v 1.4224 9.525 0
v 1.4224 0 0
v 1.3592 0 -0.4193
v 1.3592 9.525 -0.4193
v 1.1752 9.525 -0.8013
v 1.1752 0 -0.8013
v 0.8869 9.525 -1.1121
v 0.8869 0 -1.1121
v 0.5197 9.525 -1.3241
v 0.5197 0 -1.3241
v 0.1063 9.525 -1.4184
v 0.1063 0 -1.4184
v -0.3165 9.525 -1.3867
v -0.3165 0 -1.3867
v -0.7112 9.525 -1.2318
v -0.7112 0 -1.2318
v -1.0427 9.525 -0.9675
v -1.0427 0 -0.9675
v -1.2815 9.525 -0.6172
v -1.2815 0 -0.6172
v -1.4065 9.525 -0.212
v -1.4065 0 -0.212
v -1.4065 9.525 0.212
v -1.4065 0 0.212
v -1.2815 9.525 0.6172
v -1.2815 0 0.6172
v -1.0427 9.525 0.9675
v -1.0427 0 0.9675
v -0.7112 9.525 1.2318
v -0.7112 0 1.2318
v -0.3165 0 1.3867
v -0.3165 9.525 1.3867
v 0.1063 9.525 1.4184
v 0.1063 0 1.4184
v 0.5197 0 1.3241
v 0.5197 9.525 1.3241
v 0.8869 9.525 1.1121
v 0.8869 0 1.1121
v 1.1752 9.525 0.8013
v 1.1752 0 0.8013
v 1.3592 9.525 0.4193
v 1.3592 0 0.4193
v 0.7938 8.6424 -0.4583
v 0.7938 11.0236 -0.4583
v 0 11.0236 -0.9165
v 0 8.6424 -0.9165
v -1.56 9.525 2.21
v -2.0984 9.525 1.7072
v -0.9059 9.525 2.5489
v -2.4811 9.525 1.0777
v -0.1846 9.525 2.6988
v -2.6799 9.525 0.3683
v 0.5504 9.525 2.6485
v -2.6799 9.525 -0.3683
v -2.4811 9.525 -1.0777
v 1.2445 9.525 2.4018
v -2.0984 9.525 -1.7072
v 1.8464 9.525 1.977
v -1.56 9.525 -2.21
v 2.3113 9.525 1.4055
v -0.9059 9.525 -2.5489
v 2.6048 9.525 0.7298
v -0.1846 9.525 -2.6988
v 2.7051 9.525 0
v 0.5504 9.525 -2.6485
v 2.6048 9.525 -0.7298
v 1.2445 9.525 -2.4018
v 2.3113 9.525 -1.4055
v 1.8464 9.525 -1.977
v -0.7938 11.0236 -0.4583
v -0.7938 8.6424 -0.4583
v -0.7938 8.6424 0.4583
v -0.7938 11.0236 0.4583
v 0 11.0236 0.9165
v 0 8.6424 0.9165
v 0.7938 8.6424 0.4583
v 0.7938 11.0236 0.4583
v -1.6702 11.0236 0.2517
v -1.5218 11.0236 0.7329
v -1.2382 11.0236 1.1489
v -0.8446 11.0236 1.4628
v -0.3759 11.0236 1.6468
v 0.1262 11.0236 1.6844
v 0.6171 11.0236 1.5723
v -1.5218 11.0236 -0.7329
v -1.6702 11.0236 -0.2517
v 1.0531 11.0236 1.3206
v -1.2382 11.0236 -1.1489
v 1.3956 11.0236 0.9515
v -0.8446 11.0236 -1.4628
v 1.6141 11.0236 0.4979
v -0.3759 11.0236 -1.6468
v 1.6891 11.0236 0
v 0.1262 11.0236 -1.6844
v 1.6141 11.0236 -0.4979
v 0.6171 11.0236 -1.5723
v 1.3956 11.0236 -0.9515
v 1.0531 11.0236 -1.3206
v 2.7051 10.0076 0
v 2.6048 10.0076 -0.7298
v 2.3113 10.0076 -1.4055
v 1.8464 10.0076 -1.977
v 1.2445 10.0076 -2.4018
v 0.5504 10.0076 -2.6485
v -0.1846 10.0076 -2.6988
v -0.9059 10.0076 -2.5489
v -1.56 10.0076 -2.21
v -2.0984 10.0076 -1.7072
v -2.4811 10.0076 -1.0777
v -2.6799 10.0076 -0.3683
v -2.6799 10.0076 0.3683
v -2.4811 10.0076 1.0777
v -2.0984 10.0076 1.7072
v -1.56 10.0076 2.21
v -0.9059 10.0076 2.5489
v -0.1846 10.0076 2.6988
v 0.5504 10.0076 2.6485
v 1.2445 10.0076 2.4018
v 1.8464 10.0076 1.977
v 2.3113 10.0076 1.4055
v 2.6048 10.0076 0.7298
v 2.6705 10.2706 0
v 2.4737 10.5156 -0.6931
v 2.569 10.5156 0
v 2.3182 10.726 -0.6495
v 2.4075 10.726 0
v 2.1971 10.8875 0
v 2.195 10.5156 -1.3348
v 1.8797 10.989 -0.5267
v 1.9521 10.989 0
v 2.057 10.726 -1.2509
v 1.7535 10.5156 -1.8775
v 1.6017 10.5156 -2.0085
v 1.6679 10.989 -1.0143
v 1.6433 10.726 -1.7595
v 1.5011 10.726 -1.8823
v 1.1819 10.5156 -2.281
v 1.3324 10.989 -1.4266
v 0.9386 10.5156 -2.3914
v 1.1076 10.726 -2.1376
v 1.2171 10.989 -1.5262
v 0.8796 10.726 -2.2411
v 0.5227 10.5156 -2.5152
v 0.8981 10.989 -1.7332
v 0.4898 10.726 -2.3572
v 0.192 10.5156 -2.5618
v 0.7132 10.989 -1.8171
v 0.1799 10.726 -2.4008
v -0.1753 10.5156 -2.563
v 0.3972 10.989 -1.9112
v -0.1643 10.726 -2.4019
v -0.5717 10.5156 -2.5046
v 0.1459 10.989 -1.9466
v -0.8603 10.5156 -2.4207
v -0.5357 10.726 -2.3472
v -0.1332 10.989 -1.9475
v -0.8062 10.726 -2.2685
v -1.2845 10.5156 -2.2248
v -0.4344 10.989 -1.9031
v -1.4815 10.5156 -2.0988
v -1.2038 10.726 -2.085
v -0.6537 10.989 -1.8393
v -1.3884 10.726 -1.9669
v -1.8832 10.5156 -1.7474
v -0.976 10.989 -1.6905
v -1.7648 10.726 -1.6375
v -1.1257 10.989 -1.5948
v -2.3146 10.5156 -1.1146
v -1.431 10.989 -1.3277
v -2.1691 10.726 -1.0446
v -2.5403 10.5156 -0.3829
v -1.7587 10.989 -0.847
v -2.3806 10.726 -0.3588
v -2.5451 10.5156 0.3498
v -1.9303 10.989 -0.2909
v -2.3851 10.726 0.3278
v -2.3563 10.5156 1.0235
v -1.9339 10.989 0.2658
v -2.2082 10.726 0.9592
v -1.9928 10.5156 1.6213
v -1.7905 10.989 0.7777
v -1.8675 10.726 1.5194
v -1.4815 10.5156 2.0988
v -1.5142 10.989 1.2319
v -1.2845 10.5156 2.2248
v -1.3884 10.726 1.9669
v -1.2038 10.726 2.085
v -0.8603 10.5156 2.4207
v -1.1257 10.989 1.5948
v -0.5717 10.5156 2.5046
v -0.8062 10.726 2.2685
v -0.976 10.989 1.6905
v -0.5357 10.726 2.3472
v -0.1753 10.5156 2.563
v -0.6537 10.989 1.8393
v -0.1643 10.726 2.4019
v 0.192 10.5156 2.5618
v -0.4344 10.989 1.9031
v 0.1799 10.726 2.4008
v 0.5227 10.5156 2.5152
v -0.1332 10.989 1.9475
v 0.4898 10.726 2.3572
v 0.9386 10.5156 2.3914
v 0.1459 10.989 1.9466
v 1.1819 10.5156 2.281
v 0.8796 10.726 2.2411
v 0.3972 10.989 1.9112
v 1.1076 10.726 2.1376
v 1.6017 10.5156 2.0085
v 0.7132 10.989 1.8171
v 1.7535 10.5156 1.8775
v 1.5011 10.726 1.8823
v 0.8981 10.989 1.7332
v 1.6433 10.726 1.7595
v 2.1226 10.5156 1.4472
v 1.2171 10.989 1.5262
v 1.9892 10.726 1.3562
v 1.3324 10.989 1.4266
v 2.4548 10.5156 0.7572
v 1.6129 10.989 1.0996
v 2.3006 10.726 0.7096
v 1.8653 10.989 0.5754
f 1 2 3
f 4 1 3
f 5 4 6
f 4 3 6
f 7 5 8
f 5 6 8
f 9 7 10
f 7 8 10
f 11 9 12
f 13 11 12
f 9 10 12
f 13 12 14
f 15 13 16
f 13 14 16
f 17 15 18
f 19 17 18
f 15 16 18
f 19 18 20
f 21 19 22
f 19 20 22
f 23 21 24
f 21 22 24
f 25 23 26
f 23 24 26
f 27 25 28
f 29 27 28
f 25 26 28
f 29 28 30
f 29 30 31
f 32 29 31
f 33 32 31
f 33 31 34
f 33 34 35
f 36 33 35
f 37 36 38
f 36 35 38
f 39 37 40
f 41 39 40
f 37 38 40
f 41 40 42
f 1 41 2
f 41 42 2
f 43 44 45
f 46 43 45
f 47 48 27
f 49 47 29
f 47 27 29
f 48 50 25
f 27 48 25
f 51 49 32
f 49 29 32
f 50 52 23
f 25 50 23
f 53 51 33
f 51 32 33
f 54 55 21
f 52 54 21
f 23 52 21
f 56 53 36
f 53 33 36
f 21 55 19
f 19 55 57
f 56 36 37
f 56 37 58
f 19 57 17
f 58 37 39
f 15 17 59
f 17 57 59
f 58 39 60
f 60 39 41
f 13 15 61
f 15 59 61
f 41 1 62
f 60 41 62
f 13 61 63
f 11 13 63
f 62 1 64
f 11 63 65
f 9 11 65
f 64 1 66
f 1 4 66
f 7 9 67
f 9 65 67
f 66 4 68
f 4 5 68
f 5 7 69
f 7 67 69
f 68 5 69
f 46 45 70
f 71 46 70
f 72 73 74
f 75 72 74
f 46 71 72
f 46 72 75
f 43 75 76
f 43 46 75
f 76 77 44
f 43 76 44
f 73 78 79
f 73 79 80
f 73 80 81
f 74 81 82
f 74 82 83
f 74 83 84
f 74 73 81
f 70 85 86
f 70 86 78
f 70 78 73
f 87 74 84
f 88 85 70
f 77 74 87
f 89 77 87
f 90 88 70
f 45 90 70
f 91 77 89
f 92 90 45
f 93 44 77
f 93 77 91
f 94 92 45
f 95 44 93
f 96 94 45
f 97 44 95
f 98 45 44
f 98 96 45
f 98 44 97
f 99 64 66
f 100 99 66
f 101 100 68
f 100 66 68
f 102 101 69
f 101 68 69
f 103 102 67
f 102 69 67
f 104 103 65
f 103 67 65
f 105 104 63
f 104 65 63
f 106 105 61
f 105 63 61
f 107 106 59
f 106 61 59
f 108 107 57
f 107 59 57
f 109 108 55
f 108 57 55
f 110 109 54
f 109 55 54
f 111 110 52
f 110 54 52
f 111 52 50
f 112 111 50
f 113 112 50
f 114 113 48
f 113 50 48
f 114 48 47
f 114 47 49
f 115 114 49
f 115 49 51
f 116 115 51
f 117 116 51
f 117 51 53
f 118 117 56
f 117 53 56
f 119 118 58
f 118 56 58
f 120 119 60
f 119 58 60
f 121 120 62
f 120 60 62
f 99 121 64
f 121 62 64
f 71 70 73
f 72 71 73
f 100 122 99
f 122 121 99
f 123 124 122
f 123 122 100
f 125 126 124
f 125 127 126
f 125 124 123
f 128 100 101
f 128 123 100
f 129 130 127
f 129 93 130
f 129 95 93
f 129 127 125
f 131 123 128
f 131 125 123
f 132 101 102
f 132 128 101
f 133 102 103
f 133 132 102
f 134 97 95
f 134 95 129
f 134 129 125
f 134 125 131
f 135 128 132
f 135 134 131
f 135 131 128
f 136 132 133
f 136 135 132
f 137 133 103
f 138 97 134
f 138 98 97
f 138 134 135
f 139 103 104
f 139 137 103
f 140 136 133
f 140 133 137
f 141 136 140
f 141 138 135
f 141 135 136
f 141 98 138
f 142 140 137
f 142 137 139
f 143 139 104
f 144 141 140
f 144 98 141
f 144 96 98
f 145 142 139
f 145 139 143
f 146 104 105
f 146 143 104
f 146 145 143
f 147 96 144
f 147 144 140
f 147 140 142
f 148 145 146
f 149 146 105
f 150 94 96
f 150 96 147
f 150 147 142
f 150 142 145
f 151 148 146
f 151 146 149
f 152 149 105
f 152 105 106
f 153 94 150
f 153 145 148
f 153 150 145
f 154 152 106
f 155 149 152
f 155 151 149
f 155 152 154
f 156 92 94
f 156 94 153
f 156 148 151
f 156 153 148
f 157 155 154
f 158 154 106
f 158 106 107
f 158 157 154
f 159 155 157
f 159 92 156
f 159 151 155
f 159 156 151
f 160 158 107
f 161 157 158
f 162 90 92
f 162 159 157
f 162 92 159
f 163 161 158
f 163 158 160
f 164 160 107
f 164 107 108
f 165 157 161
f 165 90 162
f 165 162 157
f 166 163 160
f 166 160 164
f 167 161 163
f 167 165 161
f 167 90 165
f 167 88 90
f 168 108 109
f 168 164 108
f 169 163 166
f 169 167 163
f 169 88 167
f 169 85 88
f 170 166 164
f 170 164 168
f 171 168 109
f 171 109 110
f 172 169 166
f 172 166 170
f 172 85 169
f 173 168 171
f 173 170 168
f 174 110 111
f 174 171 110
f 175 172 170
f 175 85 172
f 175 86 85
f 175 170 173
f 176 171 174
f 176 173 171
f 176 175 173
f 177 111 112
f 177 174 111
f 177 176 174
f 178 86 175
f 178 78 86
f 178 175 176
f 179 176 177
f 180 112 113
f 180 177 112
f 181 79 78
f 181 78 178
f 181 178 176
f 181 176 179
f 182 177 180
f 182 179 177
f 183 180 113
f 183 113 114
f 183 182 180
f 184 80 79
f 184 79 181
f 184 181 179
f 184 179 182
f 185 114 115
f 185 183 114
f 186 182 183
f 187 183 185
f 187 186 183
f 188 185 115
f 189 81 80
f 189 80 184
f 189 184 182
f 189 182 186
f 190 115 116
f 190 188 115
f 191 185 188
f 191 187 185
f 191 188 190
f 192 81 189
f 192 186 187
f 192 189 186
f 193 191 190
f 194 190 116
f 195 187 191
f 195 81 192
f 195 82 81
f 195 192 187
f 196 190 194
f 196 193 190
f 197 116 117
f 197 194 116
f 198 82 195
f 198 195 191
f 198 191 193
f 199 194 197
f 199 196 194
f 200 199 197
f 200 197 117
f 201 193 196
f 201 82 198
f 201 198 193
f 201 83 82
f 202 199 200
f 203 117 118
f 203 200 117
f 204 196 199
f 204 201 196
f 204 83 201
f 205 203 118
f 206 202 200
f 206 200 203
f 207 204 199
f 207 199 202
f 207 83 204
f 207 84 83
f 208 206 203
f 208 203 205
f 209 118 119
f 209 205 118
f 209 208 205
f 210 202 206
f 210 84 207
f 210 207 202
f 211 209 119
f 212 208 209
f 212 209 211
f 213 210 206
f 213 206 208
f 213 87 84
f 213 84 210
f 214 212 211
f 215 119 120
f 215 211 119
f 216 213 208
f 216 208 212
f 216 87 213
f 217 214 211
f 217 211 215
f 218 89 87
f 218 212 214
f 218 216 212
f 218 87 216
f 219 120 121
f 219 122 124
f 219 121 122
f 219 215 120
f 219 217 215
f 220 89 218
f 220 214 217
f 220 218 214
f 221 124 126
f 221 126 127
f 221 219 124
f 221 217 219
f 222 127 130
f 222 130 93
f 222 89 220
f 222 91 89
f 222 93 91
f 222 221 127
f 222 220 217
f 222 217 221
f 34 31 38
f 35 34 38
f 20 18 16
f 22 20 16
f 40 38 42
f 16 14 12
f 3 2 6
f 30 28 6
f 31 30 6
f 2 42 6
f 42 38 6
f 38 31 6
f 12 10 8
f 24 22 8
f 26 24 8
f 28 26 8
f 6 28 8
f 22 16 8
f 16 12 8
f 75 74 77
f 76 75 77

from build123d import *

# Parameters (mm, degrees)
SKETCH1_R           = 1.4224
BOSS_EXTRUDE1_DEPTH = 9.525
SKETCH2_R           = 2.7051
BOSS_EXTRUDE2_DEPTH = 1.4986
FILLET1_R           = 1.016
CUT_EXTRUDE1_DEPTH  = 2.38125


with BuildPart() as part:
    # Sketch1 → Boss-Extrude1 (new body)
    with BuildSketch(Plane(origin=(0, 0, 0), x_dir=(1, 0, 0), z_dir=(0, 1, 0))):
        Circle(SKETCH1_R)
    extrude(amount=BOSS_EXTRUDE1_DEPTH)

    # Sketch2 → Boss-Extrude2 (add)
    with BuildSketch(Plane(origin=(0, 9.525, 0), x_dir=(1, 0, 0), z_dir=(0, 1, 0))):
        Circle(SKETCH2_R)
    extrude(amount=BOSS_EXTRUDE2_DEPTH)

    # Fillet1
    fillet1_edges = [part.edges().sort_by_distance(p)[0] for p in [
        (-2.7051, 11.0236, 0),
    ]]
    fillet(fillet1_edges, radius=FILLET1_R)

    # Sketch3 → Cut-Extrude1 (cut)
    with BuildSketch(Plane(origin=(0, 11.0236, 0), x_dir=(1, 0, 0), z_dir=(0, 1, 0))):
        Polygon((0, 0.916543552), (-0.79375, 0.458271776), (-0.79375, -0.458271776), (0, -0.916543552), (0.79375, -0.458271776), (0.79375, 0.458271776), align=None)
    extrude(amount=-CUT_EXTRUDE1_DEPTH, mode=Mode.SUBTRACT)


solid = part.part
